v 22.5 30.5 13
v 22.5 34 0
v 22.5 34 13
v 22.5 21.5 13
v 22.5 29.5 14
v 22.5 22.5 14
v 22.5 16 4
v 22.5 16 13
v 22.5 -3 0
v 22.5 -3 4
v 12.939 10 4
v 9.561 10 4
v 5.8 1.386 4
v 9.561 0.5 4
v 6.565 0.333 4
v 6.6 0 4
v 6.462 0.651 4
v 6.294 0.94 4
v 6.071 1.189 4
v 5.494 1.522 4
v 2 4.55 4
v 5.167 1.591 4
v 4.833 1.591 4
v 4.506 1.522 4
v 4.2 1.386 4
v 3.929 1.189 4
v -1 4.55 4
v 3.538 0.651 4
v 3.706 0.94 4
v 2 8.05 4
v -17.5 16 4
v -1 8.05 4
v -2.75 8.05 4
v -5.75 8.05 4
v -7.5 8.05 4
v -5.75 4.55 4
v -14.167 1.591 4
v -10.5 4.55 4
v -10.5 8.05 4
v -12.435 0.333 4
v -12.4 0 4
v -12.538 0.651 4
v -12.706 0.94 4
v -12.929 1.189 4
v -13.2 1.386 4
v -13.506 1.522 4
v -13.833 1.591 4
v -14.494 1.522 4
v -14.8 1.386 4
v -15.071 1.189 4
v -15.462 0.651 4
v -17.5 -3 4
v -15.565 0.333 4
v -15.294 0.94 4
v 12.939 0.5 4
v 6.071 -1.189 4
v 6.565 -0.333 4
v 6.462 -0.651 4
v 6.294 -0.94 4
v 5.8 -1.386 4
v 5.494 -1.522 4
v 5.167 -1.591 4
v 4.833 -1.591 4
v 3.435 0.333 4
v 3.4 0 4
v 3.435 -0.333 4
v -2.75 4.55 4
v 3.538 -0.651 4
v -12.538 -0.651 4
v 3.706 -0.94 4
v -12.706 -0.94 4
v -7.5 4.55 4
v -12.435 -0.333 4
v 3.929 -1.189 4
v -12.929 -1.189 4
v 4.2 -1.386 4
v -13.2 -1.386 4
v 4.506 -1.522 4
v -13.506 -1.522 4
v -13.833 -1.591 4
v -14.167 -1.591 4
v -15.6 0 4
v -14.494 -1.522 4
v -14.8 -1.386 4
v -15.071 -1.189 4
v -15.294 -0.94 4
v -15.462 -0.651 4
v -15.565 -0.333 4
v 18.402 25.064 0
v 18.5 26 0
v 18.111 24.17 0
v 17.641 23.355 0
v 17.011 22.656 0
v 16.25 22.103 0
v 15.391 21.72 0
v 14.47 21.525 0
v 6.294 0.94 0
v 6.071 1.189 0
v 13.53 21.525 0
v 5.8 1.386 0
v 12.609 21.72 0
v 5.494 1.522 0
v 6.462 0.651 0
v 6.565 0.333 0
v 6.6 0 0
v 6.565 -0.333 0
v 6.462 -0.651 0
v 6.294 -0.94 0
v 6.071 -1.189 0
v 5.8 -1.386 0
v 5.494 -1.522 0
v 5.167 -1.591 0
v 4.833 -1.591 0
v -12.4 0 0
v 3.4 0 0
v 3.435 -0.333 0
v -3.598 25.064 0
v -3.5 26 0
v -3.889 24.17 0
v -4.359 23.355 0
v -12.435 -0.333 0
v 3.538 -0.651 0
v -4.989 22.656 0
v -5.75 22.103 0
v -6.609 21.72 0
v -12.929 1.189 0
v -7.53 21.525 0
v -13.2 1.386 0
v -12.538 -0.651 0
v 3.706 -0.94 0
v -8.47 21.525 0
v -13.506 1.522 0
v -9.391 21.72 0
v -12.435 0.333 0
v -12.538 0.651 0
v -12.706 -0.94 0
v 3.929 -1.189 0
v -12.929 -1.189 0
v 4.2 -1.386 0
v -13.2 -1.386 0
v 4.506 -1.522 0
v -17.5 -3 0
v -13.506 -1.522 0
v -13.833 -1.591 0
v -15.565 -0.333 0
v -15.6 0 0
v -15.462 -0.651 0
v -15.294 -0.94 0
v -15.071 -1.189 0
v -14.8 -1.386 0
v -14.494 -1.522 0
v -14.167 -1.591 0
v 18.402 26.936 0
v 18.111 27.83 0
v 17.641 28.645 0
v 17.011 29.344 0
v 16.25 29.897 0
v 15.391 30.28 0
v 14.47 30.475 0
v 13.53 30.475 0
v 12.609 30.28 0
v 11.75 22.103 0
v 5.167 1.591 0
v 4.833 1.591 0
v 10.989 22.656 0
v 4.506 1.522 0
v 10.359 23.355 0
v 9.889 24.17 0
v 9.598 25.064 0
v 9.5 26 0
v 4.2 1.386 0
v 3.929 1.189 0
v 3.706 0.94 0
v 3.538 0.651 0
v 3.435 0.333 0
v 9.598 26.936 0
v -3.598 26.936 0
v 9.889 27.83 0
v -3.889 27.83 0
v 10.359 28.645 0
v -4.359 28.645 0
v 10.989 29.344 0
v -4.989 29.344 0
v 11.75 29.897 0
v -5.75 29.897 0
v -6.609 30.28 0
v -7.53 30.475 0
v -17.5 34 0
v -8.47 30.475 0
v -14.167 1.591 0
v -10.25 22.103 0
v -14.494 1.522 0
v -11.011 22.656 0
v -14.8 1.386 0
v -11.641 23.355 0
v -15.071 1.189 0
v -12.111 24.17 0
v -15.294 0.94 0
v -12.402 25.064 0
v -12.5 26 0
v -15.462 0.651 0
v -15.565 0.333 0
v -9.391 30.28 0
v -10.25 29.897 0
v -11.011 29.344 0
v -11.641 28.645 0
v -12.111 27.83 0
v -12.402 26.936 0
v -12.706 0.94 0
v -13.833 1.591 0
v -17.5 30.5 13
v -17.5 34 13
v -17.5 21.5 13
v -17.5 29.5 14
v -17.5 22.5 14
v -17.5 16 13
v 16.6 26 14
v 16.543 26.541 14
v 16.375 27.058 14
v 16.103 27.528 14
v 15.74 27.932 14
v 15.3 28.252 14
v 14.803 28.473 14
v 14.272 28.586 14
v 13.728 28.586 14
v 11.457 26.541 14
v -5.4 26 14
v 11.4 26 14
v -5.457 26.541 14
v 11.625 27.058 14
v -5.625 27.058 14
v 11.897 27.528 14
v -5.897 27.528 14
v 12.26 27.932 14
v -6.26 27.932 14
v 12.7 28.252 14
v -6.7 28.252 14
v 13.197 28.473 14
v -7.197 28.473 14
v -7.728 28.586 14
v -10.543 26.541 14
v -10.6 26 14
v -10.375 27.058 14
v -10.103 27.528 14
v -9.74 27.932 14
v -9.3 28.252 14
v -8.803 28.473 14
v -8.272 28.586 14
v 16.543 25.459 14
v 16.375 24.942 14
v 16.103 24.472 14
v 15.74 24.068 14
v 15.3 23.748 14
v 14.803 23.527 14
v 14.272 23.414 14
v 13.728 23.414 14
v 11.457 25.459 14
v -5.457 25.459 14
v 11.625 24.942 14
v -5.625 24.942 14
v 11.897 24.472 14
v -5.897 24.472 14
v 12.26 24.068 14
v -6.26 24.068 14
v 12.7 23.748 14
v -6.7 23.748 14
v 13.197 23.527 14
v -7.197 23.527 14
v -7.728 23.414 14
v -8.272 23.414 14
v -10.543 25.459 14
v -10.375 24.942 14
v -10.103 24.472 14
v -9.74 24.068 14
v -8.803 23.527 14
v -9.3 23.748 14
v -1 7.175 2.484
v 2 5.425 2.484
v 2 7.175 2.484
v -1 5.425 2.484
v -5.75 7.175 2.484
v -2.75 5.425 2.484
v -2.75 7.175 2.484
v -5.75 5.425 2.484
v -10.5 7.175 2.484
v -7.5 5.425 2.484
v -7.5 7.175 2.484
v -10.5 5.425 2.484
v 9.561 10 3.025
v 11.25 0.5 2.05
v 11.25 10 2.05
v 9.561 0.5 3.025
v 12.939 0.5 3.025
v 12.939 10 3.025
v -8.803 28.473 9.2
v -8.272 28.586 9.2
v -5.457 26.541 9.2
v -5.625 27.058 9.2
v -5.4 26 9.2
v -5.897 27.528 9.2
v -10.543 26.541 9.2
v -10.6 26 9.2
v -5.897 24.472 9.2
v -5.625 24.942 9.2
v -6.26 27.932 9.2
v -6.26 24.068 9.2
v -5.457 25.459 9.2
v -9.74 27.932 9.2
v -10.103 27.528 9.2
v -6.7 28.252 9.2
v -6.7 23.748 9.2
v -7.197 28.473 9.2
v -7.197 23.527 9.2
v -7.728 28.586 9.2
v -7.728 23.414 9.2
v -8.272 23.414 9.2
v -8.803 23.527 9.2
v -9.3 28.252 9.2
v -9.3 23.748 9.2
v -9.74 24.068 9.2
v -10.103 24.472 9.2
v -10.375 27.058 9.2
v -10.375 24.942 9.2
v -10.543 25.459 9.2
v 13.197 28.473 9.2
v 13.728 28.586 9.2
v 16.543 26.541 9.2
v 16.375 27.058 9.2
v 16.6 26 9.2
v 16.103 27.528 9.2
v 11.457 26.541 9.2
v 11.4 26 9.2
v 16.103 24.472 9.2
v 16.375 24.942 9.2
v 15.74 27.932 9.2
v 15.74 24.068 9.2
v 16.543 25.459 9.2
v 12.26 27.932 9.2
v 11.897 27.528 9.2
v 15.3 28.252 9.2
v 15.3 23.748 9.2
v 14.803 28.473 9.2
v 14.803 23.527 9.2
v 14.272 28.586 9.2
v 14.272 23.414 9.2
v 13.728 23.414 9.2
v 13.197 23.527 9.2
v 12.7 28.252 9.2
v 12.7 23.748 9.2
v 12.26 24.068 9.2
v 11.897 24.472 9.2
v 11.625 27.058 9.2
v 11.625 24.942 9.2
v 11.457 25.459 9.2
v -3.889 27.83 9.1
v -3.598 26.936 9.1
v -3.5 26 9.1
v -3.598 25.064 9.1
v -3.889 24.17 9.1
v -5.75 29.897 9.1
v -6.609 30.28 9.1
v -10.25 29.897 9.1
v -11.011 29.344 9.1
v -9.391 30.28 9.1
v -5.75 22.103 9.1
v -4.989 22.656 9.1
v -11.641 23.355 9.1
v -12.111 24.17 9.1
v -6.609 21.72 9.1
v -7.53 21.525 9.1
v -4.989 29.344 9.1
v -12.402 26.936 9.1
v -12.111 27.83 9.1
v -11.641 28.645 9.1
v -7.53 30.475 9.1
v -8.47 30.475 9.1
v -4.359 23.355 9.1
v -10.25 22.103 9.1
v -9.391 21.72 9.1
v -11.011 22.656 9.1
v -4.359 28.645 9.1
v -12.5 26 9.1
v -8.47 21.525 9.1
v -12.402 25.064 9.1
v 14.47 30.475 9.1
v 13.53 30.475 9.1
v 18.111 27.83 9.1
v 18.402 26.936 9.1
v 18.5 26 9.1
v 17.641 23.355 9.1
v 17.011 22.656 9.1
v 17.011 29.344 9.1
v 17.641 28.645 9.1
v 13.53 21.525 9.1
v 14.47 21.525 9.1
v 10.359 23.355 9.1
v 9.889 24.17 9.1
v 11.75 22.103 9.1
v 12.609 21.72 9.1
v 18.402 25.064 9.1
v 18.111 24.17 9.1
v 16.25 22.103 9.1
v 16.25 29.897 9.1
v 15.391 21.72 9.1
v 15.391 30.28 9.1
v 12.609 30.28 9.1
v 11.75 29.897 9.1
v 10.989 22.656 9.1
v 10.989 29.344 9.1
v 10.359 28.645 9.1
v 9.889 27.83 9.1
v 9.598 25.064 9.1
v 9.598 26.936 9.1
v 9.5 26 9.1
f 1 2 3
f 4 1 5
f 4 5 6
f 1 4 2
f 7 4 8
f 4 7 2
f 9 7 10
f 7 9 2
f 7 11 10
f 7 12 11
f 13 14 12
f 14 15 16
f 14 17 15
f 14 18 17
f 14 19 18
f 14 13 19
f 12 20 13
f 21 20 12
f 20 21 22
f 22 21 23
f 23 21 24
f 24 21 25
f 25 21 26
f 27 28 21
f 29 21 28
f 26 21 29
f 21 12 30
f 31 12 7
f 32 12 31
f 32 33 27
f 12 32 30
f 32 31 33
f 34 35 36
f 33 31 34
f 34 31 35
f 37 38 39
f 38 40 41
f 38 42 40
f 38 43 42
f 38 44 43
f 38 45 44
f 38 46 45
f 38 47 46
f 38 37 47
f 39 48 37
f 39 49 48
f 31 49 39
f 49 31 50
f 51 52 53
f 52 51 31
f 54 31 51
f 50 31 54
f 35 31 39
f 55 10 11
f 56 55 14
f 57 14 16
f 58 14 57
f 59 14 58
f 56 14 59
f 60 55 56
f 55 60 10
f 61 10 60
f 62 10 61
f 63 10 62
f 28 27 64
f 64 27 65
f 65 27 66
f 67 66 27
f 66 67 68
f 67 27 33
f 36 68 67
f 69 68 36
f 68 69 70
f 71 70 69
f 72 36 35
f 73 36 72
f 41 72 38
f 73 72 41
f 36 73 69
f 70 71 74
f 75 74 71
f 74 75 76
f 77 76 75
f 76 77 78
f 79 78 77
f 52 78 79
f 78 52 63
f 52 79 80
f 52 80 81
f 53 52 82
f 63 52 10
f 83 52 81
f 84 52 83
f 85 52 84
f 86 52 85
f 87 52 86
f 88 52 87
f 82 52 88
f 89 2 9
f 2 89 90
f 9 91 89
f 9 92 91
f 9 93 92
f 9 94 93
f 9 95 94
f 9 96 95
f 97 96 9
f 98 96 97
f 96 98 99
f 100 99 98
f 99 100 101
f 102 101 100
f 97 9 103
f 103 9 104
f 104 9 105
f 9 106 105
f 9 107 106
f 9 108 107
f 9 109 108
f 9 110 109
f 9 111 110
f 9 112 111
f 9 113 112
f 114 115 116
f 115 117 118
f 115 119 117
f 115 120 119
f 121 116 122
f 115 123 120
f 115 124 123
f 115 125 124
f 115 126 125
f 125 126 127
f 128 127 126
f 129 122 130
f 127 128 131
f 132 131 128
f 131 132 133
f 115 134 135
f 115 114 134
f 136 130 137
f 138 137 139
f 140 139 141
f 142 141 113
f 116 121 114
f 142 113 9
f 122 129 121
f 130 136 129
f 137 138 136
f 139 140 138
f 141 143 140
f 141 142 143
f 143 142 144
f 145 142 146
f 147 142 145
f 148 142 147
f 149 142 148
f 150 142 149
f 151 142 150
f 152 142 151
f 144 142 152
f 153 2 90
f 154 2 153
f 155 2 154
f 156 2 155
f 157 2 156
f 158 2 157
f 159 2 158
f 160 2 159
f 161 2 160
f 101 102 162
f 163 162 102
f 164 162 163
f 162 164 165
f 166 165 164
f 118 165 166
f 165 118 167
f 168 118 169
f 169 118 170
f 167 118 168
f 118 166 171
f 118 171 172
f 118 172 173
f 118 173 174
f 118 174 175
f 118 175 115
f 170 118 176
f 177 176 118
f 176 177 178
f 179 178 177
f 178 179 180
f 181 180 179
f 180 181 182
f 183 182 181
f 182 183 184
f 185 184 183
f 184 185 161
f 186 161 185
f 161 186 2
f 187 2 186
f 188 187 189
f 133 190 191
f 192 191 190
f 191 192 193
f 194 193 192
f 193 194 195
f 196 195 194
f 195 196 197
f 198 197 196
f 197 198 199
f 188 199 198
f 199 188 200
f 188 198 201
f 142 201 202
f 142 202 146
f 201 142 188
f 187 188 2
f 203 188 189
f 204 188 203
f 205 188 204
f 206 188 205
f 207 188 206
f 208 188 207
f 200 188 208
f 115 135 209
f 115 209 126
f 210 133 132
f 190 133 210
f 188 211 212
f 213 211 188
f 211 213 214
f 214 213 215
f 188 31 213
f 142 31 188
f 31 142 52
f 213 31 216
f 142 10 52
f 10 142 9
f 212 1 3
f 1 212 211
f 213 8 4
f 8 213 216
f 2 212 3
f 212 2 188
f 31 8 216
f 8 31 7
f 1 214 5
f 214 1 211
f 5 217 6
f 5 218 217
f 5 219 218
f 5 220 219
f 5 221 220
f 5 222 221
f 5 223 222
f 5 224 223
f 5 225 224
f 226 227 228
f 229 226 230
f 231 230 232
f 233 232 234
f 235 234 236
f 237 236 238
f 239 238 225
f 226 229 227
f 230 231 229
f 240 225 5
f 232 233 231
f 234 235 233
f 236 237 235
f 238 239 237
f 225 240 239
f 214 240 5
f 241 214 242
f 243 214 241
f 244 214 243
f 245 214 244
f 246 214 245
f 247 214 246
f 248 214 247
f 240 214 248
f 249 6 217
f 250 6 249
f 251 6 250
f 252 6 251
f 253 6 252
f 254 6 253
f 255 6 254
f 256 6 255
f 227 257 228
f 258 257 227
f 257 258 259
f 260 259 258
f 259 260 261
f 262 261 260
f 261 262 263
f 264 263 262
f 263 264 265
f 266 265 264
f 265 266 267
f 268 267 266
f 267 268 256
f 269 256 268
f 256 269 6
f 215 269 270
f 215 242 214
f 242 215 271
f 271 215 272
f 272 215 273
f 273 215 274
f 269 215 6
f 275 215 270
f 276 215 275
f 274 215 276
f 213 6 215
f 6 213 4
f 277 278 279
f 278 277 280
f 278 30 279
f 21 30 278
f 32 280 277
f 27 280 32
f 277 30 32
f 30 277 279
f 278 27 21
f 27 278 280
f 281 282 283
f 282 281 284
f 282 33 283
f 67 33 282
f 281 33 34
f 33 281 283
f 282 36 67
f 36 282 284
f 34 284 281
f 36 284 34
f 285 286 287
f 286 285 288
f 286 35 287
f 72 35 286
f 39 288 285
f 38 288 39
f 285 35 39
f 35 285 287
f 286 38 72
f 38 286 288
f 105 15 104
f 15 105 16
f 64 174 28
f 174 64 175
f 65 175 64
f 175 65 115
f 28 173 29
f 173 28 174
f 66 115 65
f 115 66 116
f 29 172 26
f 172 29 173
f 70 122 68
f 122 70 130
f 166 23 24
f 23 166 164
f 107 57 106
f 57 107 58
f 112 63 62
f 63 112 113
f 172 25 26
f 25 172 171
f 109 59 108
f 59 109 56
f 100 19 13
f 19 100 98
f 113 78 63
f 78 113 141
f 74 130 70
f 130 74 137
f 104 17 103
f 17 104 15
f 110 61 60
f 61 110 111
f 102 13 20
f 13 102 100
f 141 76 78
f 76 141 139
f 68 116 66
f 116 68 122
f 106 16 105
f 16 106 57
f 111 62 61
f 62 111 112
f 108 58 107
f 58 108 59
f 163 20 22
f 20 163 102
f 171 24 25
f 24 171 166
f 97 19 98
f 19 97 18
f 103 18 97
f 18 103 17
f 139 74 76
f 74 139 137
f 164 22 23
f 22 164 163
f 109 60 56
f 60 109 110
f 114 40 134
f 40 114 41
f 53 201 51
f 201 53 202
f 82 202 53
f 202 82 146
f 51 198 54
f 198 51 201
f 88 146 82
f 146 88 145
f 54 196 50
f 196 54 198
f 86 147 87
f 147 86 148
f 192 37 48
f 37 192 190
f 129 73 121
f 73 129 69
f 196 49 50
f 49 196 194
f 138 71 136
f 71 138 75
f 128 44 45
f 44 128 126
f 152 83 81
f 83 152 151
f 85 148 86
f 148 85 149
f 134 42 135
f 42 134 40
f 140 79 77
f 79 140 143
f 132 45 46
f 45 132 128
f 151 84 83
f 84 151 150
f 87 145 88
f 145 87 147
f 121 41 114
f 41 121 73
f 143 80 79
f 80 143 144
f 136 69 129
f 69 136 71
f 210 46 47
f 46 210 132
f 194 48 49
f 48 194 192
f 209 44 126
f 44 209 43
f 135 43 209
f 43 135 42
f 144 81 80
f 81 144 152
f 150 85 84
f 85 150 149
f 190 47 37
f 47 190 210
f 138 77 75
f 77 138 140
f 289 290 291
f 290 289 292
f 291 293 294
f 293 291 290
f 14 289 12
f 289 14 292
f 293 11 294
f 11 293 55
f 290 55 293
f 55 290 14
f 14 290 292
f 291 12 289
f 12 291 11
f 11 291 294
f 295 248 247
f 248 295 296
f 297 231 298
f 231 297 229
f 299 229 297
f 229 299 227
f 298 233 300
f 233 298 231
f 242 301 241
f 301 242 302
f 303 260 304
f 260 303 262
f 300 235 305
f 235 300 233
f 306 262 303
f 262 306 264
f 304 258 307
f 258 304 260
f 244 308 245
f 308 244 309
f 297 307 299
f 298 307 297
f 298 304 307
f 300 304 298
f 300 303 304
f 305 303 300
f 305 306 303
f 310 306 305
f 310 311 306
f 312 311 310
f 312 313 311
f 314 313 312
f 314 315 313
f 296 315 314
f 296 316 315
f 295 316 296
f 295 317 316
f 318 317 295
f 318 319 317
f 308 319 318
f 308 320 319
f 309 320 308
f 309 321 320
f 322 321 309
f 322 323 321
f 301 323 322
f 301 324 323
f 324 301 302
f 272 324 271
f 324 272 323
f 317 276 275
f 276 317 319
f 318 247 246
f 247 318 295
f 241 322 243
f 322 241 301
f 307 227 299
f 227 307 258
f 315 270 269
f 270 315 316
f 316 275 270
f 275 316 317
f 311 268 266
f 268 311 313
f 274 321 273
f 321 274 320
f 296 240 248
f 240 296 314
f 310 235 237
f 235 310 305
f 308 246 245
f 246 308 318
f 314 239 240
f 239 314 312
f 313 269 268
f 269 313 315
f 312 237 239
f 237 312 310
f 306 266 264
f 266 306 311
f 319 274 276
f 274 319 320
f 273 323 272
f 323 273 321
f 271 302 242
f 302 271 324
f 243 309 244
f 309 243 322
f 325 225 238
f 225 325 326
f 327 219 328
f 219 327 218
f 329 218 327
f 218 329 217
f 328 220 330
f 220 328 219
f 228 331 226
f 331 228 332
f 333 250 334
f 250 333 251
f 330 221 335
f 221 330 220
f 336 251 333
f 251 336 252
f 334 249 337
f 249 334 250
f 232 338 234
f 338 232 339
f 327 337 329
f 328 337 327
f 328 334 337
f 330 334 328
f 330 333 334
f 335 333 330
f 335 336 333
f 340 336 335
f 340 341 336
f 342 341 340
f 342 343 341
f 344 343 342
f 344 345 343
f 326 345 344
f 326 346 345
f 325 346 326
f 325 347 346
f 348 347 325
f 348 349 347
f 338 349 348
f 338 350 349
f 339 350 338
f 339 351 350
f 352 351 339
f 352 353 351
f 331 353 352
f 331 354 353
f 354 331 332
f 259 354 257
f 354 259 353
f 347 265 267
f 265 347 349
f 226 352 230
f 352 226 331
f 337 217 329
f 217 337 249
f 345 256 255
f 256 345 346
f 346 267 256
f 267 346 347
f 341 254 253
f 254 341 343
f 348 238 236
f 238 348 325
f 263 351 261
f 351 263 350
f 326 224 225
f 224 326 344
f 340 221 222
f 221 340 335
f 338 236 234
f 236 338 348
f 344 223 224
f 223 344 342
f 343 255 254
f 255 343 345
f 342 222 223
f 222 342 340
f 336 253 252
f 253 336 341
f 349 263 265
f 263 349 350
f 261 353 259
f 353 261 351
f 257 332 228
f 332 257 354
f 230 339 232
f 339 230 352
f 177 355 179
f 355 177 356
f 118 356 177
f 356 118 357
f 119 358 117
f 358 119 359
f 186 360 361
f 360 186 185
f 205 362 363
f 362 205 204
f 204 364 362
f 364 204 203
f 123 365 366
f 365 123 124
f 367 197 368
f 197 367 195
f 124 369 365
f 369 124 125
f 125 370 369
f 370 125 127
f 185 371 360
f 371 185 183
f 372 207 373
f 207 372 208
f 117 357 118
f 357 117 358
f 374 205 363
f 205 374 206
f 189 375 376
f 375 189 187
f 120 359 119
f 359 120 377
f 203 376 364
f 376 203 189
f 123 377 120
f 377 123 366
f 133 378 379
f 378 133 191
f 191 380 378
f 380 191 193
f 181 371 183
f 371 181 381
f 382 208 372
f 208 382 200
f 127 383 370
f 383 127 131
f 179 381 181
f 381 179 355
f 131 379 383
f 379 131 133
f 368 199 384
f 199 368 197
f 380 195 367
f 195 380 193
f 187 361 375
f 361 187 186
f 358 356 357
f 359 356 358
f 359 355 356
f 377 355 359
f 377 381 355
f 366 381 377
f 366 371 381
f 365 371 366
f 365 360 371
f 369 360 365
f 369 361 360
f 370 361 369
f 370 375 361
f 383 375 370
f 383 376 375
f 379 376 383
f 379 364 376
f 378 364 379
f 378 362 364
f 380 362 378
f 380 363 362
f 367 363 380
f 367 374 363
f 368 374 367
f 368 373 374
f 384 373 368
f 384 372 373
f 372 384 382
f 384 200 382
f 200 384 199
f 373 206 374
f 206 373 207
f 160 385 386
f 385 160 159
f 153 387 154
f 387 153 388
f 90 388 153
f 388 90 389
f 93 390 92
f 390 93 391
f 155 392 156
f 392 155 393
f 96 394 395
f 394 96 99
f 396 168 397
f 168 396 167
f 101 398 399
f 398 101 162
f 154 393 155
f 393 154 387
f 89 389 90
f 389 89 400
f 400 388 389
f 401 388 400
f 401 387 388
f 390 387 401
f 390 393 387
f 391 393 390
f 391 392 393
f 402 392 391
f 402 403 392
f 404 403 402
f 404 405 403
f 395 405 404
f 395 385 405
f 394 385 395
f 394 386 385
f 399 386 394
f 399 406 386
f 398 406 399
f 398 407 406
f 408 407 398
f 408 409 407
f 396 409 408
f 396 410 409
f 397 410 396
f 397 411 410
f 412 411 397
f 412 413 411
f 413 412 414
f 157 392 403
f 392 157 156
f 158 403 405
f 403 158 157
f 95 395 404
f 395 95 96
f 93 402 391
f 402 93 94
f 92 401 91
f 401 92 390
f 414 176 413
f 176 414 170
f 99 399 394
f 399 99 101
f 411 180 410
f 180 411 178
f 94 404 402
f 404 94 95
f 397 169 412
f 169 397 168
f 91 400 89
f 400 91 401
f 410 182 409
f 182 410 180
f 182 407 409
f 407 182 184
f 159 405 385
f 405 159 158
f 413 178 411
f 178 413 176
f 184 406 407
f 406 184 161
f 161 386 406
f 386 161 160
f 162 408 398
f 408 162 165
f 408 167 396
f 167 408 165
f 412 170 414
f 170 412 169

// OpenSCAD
$fn=30;

/* zDrop -- gap between bottom of rail and top of switch assembly 
 *          (in mm)
 */
zDrop = 1;

zEndstopMount();

module zEndstopMount() {
   difference() {
      union() { 
         /* base and connector to frame */
         translate([-17.5,-2-zDrop,0]) cube([40,36,4]);
         translate([-17.5,16,0]) cube([40,18,13]);

         /* angled bit to fit in v-slot */
         translate([-17.5,18+3.5,13]) rotate([90,0,0]) rotate([0,90,00])
            linear_extrude(height=40)
            polygon(points=[[-0.1,0],[0,0],[1,1],[8,1],[9,0],[9,-0.1]]);
      }

      /* cutouts */
      union() {
         translate([5,1-zDrop,4]) rotate([0,180,0]) endstopCutouts();
   
         /* bolt holes */
         translate([-8,26,14-4.8]) cylinder(h=15,d=5.2);
         translate([14,26,14-4.8]) cylinder(h=15,d=5.2);

         /* cap holes (with a little gap to allow bridging */
         translate([-8,26,-0.1]) cylinder(h=14-4.8,d=9);
         translate([14,26,-0.1]) cylinder(h=14-4.8,d=9);
      }
   }
}

module endstopCutouts() {
   translate([3,6.3,0]) rotate([30,0,0]) {
      rotate([0,90,0]) cylinder($fn=6,d=3.5,h=3);
      translate([4.75,0,0]) rotate([0,90,0]) cylinder($fn=6,d=3.5,h=3);
      translate([9.5,0,0]) rotate([0,90,0]) cylinder($fn=6,d=3.5,h=3);
   }
   translate([0,0,-0.1]) cylinder(h=5,d=3.2);
   translate([19,0,-0.1]) cylinder(h=5,d=3.2);
   translate([-6.25,10,0]) rotate([90,30,0]) cylinder($fn=6,d=3.9,h=9.5);
}
